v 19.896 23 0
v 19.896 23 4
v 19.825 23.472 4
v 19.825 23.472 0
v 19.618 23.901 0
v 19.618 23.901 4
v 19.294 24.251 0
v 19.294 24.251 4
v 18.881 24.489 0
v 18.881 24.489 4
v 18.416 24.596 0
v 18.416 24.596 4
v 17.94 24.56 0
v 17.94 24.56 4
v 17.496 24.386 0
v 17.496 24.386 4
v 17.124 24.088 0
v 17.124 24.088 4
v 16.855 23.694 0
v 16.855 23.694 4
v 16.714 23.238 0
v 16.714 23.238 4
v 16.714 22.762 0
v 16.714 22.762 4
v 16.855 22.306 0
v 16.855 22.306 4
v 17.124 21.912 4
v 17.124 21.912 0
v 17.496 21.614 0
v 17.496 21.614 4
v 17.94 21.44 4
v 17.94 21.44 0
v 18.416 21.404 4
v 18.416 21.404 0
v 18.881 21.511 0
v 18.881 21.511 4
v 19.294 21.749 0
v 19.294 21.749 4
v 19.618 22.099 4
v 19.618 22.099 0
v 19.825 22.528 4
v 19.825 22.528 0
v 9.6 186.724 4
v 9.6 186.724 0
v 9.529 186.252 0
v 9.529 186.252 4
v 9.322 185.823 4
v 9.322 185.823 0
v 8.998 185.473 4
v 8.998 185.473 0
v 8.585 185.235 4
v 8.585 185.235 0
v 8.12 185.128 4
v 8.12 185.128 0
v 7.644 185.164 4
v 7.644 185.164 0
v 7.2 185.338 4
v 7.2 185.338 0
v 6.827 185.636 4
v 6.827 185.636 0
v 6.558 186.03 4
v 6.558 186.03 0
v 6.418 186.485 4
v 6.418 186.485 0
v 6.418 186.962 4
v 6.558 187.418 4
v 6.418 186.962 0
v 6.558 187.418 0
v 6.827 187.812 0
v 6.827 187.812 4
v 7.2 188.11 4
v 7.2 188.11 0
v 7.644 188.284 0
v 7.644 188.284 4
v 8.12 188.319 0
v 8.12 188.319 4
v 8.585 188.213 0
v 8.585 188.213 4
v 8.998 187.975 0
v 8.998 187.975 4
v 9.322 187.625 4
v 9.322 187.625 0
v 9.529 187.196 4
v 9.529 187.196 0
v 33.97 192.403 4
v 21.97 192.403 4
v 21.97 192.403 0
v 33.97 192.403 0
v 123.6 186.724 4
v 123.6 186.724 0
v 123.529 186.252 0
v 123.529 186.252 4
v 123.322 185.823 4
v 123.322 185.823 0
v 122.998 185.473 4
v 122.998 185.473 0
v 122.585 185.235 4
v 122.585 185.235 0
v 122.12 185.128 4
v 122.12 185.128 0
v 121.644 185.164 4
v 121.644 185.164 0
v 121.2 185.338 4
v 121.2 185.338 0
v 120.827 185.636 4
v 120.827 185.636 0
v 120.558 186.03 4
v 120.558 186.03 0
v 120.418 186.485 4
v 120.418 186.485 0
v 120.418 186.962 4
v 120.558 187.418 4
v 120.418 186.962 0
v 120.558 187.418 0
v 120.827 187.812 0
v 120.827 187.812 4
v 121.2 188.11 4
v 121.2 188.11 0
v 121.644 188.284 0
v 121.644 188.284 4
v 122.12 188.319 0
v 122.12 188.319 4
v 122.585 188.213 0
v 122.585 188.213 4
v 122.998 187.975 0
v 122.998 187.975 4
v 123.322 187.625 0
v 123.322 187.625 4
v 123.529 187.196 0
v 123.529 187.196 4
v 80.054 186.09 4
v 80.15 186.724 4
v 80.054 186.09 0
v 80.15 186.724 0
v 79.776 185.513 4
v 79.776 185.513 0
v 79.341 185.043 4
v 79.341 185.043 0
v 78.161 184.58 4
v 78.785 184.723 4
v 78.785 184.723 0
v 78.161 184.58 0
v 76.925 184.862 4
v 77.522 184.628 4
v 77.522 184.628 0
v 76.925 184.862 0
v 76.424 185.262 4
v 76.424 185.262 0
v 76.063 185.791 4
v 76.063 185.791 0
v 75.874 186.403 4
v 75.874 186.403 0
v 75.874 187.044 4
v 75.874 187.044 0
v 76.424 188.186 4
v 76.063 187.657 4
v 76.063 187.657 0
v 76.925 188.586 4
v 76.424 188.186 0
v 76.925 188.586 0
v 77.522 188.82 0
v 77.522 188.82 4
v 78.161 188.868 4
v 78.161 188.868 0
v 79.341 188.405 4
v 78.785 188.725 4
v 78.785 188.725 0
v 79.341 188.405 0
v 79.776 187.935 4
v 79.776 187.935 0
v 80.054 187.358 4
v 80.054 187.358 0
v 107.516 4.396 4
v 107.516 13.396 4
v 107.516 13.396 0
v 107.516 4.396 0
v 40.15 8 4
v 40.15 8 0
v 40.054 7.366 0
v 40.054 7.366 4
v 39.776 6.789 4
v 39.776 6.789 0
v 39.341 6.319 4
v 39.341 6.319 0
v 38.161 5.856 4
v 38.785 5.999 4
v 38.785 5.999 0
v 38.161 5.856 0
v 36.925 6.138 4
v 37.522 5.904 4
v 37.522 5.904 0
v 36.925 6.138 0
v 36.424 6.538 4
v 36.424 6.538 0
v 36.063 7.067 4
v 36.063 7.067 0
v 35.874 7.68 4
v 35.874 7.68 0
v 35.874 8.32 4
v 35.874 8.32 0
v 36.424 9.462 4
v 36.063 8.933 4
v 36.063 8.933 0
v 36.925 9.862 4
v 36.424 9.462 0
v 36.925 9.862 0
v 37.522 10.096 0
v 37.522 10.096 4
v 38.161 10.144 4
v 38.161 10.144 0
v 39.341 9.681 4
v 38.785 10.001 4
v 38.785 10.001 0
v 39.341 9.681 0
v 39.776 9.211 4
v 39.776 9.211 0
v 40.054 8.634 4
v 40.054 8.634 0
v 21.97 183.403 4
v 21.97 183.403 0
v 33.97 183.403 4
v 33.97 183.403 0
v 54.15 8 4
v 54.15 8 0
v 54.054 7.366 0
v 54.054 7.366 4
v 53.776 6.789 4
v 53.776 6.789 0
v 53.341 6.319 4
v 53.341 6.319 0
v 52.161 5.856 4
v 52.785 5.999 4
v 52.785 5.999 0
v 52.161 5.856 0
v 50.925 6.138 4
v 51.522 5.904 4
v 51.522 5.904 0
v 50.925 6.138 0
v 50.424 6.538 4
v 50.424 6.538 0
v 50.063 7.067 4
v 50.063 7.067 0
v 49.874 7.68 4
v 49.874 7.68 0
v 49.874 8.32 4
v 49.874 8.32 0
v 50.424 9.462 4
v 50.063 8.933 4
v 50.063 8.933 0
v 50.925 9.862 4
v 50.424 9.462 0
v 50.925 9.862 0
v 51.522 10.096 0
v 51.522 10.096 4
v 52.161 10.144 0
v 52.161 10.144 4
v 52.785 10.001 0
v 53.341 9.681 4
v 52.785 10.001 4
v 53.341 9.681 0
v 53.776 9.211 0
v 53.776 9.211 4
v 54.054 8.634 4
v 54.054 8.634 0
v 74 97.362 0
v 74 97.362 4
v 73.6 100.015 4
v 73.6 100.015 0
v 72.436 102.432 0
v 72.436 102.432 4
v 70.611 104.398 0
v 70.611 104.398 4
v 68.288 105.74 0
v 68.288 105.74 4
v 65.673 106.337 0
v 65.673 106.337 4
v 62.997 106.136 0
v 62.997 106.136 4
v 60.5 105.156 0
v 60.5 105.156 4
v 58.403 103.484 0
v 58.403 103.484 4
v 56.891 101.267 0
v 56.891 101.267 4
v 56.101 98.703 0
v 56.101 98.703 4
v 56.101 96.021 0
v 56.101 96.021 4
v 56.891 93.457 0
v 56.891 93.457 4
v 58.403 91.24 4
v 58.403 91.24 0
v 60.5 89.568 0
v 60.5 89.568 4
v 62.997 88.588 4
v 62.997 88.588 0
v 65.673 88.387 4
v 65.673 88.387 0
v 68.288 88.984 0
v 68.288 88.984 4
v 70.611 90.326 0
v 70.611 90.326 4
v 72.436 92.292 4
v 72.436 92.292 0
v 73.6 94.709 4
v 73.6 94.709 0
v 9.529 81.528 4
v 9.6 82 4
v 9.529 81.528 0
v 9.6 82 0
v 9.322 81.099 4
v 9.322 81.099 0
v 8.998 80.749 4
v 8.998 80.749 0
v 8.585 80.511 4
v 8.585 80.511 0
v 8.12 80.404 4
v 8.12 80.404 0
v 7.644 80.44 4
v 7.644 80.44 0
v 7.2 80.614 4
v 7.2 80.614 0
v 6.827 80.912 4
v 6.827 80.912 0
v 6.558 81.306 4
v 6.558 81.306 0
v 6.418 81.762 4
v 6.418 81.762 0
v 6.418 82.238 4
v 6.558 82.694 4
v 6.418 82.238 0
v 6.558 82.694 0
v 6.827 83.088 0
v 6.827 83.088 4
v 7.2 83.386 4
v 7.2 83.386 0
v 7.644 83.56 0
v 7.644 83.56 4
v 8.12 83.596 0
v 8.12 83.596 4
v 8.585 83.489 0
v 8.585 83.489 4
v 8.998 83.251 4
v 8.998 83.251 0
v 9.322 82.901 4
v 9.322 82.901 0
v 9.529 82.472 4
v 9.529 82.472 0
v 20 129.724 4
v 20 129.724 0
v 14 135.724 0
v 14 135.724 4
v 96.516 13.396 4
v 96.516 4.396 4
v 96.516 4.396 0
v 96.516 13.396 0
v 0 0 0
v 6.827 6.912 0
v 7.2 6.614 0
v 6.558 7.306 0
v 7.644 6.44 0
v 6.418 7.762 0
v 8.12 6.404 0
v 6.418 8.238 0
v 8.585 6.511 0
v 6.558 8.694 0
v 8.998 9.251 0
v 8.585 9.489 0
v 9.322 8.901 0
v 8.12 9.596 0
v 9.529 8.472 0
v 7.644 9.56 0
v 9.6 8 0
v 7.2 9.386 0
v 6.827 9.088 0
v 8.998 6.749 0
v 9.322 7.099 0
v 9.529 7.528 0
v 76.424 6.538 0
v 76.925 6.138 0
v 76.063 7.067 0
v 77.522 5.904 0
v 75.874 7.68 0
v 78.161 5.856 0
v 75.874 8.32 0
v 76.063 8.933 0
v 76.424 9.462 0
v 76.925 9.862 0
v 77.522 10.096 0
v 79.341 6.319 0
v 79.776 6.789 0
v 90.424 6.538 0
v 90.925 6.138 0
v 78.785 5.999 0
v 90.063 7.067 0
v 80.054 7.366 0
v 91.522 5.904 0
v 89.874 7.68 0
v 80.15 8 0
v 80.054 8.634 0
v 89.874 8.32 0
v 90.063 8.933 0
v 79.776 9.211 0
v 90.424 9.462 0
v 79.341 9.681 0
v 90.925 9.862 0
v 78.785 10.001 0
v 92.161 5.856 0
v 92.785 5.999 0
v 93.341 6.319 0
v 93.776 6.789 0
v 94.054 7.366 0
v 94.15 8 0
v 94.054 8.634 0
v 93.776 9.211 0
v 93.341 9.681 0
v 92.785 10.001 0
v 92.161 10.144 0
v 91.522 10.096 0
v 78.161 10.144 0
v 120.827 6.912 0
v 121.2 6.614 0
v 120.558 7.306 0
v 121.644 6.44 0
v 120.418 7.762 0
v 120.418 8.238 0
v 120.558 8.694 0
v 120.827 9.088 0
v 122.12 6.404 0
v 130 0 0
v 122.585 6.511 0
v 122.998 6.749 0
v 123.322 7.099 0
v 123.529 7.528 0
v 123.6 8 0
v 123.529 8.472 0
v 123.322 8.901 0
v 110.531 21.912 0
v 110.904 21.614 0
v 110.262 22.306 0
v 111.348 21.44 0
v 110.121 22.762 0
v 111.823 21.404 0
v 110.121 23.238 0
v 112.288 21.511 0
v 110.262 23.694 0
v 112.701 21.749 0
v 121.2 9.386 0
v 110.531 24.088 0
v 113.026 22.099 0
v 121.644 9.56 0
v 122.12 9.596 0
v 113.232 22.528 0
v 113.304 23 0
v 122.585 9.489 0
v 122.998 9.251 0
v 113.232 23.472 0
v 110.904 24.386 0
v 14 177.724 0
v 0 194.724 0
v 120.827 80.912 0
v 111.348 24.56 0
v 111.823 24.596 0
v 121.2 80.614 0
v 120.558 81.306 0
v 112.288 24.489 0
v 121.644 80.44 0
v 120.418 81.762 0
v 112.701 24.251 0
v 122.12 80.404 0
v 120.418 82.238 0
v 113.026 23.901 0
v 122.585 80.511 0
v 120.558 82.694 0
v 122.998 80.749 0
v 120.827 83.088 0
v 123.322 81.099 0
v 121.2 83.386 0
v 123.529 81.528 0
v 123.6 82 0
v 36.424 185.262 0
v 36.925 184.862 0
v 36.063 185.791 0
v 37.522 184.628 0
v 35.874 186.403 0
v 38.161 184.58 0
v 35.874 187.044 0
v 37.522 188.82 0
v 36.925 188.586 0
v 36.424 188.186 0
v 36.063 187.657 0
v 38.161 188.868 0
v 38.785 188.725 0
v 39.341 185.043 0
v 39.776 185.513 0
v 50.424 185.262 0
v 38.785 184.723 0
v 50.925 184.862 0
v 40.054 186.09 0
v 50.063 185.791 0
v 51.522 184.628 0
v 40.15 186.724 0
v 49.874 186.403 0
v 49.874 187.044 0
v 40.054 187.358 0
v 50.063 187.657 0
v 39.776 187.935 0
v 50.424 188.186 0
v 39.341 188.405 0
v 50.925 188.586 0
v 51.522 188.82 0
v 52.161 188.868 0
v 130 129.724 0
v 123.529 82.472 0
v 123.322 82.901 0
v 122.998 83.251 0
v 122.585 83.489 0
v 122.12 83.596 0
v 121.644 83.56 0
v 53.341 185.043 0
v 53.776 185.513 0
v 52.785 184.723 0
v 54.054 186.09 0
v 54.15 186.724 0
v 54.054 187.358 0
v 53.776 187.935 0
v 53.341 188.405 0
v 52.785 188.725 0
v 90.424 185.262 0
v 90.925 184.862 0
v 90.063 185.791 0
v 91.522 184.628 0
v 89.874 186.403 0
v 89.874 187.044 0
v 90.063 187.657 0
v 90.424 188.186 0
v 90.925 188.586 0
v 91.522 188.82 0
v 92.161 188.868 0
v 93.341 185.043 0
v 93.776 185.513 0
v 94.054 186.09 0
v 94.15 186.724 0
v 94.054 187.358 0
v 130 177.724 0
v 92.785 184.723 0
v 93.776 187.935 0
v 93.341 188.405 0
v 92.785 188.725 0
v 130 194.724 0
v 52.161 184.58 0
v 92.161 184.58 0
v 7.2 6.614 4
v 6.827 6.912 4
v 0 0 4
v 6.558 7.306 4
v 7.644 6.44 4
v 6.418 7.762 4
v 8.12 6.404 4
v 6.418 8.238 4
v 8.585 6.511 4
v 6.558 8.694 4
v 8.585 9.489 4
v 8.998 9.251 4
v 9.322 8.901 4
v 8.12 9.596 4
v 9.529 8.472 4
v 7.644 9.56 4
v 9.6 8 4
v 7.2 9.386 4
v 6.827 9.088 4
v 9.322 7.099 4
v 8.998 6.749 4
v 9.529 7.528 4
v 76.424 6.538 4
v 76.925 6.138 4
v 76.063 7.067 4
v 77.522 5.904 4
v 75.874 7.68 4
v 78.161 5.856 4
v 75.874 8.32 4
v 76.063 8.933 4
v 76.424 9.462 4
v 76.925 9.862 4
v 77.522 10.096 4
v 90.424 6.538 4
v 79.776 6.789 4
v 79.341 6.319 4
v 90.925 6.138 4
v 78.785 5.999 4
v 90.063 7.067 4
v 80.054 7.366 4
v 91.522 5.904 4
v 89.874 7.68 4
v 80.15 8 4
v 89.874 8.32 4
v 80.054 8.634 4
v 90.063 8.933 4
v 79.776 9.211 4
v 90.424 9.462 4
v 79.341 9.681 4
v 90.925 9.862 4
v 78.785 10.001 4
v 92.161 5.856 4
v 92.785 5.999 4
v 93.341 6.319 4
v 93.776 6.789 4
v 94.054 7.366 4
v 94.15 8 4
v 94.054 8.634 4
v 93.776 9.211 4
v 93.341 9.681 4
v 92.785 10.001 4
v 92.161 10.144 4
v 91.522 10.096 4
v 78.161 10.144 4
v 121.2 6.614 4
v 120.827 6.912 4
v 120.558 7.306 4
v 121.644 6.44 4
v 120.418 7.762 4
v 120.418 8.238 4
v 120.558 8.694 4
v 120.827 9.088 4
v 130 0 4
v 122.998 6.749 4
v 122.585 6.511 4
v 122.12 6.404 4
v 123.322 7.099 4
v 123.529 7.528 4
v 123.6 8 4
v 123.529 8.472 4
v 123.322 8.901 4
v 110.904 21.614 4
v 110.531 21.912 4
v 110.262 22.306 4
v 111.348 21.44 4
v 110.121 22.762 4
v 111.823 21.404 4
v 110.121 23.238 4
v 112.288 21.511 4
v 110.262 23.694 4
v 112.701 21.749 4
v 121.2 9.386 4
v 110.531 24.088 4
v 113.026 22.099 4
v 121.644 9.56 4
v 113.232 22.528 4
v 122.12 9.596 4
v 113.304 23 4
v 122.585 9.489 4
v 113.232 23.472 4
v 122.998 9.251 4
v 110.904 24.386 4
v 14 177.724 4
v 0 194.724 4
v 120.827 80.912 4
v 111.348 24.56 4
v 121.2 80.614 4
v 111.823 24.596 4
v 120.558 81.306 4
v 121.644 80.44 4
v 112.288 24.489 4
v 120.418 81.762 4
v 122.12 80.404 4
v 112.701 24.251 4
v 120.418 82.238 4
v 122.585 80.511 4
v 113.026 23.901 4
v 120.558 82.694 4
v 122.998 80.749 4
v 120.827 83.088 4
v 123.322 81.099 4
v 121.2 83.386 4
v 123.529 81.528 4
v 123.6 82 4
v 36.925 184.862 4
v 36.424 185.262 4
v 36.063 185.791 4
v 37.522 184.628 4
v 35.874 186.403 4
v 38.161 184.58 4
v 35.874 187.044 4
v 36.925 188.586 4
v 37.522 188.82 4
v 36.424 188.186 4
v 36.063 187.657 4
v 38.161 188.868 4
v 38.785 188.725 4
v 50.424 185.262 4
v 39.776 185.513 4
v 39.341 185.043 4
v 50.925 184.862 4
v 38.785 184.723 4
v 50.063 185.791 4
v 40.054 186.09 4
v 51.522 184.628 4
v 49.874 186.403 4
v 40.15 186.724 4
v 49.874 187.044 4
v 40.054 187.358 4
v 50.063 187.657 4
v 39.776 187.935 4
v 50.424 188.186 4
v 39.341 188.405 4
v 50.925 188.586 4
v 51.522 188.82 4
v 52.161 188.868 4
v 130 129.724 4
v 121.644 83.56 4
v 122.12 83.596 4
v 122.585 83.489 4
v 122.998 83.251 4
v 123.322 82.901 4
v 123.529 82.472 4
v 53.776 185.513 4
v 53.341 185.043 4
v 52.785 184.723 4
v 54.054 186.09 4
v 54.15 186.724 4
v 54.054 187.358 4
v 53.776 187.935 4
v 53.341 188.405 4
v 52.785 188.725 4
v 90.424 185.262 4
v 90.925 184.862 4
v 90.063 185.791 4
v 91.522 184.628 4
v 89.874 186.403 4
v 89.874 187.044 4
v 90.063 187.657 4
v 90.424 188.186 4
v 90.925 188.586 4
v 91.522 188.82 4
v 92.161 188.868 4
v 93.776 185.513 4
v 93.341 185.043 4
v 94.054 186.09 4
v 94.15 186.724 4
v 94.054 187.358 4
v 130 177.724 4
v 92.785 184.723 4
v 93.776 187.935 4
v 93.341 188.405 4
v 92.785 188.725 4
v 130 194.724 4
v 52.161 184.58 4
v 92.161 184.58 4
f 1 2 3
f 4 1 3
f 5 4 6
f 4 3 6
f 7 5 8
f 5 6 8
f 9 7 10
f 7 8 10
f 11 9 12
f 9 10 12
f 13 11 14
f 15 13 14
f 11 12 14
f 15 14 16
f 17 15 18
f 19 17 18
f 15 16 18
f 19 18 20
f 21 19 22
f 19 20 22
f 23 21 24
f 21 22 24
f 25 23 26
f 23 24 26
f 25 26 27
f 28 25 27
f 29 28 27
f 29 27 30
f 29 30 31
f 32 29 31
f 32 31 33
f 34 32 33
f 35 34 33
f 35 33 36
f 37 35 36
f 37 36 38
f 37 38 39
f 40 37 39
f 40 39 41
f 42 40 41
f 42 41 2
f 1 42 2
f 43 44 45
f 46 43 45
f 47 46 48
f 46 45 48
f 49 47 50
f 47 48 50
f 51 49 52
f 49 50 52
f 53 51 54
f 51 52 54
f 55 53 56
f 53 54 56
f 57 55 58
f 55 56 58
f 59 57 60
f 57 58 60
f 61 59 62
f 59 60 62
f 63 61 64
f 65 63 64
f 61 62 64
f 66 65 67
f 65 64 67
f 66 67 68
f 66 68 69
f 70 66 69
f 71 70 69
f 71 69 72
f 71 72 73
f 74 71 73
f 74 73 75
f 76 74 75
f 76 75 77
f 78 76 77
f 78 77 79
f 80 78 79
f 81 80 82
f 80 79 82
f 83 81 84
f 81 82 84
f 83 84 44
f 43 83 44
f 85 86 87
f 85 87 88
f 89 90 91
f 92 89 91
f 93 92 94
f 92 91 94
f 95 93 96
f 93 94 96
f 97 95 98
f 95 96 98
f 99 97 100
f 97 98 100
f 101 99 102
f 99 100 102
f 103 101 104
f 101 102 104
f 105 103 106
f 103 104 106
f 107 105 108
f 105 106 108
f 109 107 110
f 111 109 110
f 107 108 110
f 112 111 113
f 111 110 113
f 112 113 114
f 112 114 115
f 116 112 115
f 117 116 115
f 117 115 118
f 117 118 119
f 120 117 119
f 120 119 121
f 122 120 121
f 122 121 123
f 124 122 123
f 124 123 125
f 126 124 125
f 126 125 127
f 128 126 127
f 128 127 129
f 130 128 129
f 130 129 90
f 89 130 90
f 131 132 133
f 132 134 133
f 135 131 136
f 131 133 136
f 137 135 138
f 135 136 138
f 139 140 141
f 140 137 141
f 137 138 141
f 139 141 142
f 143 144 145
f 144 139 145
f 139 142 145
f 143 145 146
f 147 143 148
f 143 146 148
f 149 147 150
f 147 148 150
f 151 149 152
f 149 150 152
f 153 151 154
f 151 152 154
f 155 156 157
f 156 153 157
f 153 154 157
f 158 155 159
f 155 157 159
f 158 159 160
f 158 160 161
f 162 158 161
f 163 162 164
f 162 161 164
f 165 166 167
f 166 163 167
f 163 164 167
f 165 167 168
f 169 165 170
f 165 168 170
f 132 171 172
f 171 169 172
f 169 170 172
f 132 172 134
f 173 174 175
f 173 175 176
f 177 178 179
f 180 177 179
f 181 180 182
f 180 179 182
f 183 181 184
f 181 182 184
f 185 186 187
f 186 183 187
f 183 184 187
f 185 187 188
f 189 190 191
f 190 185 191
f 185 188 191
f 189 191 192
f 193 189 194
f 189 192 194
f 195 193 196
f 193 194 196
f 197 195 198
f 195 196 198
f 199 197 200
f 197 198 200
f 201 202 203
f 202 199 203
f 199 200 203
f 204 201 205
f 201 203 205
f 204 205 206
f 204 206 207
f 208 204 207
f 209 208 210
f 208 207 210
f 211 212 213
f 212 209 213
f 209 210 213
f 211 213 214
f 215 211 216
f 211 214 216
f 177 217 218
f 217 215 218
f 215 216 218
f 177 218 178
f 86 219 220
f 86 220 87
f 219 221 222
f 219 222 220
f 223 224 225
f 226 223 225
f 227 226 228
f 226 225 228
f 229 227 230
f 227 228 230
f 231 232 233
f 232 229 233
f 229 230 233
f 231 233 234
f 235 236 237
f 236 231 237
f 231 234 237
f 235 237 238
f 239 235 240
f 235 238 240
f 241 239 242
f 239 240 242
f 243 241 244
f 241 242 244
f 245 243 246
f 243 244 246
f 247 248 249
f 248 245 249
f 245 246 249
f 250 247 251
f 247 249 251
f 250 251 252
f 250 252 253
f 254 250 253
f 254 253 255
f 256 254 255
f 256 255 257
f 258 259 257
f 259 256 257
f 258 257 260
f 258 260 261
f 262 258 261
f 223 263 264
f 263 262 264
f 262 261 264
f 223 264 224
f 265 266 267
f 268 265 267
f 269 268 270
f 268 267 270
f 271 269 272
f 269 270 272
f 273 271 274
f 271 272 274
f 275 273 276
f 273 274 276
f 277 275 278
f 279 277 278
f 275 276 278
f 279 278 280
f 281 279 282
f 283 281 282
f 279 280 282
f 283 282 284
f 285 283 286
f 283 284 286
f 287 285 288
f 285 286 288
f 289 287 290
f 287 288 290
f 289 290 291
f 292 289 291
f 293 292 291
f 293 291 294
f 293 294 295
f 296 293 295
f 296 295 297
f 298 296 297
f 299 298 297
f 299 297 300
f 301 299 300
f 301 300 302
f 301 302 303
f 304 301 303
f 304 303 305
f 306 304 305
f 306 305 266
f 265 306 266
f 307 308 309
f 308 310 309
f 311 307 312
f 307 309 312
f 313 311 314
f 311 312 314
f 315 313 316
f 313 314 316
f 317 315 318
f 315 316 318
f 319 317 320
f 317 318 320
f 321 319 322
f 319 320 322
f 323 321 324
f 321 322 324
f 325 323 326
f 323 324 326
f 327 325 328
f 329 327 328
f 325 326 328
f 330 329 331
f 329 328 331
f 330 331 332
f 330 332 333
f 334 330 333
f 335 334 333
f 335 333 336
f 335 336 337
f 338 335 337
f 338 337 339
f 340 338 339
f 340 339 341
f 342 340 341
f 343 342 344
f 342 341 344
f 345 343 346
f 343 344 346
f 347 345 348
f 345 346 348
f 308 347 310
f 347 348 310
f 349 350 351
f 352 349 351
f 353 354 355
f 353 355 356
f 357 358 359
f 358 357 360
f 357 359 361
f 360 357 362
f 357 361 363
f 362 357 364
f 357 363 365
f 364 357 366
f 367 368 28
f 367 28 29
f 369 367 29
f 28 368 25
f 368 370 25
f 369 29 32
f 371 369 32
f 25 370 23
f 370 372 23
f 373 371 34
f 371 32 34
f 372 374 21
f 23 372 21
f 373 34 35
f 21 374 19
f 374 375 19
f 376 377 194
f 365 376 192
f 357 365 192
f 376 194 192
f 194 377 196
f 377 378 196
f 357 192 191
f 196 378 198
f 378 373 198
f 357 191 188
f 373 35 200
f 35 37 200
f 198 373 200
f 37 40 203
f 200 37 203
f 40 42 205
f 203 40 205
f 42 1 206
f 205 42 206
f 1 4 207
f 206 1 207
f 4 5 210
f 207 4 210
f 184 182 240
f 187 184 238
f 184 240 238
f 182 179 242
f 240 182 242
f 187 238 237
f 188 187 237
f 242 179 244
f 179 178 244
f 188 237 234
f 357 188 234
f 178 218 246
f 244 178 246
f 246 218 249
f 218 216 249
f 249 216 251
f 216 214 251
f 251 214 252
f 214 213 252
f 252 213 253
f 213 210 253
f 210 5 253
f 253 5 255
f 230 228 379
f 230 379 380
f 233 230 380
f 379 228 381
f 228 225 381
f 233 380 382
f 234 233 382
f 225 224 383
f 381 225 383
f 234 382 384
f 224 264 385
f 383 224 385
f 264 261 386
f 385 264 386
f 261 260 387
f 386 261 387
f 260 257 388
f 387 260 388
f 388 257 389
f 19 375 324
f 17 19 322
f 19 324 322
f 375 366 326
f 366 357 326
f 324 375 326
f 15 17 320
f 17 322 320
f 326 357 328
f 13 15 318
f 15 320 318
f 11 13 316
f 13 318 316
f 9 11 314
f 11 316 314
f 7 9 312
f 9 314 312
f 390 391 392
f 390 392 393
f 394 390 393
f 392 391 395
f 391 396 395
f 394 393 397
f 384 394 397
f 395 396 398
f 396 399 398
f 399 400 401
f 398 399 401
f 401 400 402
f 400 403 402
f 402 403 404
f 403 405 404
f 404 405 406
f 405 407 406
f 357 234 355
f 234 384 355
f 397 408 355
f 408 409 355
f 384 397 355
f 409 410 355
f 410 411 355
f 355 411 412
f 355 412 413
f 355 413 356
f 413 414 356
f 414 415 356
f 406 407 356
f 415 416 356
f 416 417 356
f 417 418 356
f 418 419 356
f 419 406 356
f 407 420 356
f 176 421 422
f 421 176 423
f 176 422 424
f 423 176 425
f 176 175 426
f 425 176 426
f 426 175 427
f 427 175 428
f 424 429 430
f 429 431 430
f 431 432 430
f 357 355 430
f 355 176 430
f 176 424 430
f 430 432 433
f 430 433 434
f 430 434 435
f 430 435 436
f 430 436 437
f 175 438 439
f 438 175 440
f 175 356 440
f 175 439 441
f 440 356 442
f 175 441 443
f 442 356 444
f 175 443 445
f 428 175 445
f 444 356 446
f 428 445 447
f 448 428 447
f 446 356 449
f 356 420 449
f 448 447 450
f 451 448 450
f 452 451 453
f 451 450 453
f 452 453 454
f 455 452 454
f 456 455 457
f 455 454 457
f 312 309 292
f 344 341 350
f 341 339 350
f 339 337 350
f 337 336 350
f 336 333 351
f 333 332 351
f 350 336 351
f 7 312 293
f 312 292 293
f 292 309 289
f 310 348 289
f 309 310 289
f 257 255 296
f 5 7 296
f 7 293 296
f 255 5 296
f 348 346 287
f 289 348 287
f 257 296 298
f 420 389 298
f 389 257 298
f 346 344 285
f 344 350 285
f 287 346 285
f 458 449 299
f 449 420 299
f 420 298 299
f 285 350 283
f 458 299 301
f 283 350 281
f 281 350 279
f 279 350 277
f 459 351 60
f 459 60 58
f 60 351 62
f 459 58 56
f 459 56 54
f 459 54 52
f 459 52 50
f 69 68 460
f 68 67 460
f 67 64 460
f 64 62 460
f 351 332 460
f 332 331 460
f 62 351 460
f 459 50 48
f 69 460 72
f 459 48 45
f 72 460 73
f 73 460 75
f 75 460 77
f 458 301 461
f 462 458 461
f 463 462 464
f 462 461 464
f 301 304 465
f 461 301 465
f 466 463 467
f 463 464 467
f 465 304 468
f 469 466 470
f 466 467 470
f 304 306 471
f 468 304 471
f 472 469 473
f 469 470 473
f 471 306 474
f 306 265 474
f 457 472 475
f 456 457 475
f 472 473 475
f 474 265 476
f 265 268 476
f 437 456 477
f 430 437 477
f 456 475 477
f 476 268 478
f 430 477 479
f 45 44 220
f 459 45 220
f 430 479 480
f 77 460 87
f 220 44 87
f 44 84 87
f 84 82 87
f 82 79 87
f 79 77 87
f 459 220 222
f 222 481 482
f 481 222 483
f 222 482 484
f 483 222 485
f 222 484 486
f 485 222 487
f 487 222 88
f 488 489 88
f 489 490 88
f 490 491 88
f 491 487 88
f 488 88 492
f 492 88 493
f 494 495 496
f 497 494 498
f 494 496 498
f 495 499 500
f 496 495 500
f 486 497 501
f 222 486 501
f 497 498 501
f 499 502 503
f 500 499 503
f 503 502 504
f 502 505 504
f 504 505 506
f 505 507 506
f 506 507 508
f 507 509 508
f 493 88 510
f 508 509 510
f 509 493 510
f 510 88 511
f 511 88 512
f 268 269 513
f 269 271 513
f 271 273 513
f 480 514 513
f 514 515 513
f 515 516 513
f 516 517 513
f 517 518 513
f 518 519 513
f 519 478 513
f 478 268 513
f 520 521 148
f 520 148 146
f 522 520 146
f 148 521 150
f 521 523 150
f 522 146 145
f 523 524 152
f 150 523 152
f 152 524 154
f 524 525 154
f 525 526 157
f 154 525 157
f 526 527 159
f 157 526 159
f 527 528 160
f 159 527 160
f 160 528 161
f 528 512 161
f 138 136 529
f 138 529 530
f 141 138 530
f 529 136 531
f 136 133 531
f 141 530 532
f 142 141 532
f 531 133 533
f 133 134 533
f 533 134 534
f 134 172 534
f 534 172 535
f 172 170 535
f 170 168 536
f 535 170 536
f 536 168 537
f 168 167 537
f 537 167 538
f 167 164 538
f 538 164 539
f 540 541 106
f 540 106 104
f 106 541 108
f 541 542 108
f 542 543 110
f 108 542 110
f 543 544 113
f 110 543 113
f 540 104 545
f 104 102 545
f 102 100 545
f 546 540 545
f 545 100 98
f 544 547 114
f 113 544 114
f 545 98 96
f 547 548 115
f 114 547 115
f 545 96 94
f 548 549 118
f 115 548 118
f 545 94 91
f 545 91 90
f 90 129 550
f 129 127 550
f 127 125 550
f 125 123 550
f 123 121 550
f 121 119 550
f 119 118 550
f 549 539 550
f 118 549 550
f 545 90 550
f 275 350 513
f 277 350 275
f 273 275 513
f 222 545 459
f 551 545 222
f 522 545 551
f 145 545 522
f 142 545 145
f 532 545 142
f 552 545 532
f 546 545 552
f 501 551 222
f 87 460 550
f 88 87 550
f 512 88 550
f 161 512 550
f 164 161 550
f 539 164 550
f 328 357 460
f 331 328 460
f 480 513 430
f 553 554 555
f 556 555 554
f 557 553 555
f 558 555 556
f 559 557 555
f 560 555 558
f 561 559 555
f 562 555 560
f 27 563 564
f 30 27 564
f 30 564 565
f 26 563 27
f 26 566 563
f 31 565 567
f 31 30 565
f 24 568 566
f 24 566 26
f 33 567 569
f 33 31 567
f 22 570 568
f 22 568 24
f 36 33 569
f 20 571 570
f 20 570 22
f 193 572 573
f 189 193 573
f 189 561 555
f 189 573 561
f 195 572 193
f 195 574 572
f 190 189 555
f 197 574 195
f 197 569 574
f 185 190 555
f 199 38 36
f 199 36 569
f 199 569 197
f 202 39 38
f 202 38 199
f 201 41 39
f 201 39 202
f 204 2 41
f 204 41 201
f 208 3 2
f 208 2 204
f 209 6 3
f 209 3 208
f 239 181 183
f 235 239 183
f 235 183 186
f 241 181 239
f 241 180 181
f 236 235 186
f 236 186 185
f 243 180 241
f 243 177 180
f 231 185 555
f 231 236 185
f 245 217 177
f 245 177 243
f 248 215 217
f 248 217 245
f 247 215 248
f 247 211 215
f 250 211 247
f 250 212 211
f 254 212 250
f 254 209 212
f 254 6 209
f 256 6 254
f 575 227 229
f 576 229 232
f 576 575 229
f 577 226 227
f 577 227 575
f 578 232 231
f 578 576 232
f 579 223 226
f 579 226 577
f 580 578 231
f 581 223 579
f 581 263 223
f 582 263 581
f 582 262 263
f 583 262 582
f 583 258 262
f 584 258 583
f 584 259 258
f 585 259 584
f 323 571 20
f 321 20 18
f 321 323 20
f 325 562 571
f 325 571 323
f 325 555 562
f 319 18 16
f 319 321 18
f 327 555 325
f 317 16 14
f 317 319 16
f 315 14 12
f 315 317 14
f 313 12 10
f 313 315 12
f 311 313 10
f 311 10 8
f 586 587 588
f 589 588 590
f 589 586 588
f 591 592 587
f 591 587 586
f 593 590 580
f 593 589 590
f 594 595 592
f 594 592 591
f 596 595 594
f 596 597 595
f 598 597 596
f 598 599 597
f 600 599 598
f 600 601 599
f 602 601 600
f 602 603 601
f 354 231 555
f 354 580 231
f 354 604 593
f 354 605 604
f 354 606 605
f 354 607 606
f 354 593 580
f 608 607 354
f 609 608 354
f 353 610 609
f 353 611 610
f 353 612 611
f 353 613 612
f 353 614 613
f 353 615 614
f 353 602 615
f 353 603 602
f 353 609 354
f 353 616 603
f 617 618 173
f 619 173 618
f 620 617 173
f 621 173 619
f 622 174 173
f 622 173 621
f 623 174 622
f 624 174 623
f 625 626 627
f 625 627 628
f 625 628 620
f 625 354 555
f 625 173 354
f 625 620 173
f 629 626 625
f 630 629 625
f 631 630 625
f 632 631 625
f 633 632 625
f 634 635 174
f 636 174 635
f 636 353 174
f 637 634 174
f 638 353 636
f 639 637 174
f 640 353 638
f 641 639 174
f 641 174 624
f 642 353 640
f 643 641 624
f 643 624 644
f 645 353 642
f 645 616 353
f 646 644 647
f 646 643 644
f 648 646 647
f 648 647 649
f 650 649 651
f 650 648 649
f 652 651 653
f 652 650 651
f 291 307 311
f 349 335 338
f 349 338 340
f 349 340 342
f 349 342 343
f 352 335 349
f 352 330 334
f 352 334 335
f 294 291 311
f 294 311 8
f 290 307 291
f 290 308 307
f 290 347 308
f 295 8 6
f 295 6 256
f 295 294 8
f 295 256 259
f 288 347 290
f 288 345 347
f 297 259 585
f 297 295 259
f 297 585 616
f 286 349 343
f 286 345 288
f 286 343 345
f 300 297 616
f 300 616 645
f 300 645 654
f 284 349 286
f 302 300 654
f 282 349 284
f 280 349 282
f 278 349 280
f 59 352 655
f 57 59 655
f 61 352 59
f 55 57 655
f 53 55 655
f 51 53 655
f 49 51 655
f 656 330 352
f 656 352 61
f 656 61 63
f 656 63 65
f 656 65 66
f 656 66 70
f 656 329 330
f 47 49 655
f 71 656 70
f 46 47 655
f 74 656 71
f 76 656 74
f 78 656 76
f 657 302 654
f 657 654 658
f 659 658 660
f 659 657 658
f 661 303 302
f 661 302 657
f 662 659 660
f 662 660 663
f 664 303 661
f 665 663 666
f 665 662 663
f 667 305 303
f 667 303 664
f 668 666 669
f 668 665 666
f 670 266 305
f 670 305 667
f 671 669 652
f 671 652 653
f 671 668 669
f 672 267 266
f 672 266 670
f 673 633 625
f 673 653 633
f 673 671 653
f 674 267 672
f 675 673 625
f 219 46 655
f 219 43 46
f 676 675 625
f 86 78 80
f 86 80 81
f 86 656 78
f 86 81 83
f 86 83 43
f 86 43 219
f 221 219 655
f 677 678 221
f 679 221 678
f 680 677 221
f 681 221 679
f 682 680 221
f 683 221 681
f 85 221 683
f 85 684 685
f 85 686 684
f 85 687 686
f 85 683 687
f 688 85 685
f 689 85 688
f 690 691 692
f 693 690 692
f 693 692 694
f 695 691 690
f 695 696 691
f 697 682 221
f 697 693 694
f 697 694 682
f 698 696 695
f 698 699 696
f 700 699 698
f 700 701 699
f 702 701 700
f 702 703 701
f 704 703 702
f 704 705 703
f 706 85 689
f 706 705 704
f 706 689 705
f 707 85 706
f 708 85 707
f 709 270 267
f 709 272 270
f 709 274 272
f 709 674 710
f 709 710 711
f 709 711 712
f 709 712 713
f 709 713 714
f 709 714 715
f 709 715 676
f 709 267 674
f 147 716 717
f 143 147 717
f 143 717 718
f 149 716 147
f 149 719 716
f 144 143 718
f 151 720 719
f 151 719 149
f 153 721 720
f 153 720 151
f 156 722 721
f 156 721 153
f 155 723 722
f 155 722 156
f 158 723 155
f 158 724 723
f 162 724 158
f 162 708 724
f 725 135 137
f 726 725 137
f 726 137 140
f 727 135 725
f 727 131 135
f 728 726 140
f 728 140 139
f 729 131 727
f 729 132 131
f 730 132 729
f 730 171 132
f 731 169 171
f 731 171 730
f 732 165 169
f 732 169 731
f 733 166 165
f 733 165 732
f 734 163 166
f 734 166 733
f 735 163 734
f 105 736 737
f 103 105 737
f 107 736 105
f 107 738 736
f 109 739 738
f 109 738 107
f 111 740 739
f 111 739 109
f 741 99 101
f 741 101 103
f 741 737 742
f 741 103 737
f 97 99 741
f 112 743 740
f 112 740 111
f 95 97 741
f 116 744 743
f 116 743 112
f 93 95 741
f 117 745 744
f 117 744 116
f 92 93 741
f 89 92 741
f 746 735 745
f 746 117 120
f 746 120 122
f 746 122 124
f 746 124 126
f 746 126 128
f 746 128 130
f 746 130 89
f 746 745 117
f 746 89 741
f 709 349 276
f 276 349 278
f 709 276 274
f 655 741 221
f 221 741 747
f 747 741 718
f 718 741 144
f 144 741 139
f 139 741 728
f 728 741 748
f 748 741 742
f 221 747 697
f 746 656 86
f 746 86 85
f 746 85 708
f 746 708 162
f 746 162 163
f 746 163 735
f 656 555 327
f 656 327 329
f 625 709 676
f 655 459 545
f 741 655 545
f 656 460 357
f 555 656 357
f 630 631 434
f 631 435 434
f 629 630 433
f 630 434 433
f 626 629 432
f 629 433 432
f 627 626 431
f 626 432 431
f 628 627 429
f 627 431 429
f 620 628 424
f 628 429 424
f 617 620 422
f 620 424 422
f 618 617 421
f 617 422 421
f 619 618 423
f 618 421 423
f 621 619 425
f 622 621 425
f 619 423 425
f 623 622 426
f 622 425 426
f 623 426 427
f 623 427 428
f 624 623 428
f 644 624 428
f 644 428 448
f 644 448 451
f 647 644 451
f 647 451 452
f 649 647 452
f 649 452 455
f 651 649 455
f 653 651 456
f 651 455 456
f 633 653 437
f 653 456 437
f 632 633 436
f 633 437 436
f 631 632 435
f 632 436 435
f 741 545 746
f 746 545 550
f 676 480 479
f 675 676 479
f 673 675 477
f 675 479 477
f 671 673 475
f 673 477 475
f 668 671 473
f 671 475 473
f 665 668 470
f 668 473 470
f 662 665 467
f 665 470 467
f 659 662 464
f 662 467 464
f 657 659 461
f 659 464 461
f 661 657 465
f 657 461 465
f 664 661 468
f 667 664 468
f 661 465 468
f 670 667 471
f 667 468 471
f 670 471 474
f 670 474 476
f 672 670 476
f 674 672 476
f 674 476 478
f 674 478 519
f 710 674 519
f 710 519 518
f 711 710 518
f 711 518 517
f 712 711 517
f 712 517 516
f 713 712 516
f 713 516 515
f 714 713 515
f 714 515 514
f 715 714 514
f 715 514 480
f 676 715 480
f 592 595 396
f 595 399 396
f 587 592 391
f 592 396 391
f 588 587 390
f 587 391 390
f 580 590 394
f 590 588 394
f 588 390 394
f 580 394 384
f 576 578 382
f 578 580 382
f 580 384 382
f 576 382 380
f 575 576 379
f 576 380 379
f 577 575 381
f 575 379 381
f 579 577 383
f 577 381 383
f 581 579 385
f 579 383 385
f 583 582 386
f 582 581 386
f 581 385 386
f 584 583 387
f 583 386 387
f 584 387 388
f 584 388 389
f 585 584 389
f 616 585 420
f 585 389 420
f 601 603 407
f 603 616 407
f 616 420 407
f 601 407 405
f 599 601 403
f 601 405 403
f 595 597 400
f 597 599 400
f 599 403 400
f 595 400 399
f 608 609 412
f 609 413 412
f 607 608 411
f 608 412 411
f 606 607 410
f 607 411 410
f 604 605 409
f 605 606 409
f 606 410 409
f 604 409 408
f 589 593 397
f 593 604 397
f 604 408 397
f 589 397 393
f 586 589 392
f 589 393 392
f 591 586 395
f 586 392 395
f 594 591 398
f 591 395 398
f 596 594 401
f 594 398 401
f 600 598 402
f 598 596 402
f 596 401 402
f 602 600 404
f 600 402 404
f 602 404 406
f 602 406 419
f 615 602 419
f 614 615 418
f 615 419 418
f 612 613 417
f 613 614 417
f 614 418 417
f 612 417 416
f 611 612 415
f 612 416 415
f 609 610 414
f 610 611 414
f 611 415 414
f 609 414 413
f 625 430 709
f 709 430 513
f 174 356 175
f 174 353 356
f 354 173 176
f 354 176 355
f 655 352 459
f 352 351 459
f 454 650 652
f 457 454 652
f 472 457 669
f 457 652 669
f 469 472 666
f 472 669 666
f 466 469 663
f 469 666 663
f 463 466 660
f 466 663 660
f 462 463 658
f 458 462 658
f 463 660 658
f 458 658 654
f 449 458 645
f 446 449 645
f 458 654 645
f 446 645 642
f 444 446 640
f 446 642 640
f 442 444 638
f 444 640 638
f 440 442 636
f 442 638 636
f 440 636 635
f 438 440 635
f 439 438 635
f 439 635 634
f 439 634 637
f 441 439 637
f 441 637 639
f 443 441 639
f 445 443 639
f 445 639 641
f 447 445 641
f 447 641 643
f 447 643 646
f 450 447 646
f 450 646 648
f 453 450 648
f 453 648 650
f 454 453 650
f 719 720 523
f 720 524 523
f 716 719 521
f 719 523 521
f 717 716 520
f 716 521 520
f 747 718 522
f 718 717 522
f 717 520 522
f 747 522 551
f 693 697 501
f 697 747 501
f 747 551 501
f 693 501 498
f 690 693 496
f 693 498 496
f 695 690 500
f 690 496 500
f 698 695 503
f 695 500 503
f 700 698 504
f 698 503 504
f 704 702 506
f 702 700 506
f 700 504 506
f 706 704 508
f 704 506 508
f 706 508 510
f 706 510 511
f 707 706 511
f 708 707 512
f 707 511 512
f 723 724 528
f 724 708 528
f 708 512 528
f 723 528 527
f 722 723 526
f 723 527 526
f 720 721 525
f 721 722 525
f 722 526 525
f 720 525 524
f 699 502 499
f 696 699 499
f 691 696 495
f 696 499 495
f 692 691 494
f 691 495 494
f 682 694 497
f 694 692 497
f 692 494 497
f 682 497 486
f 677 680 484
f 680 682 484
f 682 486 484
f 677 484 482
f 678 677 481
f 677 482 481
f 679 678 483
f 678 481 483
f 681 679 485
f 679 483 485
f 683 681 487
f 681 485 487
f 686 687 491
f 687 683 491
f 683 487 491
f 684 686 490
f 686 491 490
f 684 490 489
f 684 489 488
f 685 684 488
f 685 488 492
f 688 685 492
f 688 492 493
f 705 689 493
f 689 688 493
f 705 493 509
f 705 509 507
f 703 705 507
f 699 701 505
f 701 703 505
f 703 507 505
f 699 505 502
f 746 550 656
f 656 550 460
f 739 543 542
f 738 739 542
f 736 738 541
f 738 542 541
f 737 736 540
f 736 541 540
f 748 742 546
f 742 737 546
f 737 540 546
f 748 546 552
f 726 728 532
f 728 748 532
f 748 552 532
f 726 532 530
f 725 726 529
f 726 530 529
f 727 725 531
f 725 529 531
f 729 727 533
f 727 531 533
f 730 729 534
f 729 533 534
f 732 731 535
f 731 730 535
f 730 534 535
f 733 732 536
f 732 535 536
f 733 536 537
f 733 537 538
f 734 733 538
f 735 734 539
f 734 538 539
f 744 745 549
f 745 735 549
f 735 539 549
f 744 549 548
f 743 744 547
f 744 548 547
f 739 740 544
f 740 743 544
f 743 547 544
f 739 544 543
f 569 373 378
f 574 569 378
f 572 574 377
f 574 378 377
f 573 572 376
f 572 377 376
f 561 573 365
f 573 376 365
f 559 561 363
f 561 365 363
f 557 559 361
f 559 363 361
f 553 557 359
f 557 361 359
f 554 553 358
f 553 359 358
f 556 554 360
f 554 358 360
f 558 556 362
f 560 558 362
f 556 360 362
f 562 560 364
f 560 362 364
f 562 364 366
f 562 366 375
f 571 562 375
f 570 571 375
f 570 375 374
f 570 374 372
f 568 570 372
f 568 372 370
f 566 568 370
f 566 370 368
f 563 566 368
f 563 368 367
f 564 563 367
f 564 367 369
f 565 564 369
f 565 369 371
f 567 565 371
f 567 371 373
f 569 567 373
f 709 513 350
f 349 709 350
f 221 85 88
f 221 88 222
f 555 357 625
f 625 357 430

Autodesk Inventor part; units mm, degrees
ref_plane "YZ Plane" through (0, 0, 0) normal (1, 0, 0) x (0, 1, 0)
ref_plane "XZ Plane" through (0, 0, 0) normal (0, 1, 0) x (-1, 0, 0)
ref_plane "XY Plane" through (0, 0, 0) normal (0, 0, 1) x (1, 0, 0)
sketch "スケッチ3" plane through (0, 0, 0) normal (0, 0, 1) x (1, 0, 0)
  line L0 (129.999999, 177.723921) -> (129.999999, 194.723921)
  line L1 (129.999999, 194.723921) -> (-0.000001, 194.723921)
  line L2 (-0.000001, 0) -> (129.999999, 0)
  circle A0 centre (77.999999, 186.723921) radius 2.15
  circle A1 centre (91.999999, 186.723921) radius 2.15
  circle A2 centre (51.999999, 186.723921) radius 2.15
  circle A3 centre (37.999999, 186.723921) radius 2.15
  circle A4 centre (77.999999, 8) radius 2.15
  circle A5 centre (91.999999, 8) radius 2.15
  circle A6 centre (51.999999, 8) radius 2.15
  circle A7 centre (37.999999, 8) radius 2.15
  line L3 (129.999999, 129.723921) -> (19.999999, 129.723921)
  line L4 (13.999999, 135.723921) -> (13.999999, 177.723921)
  line L5 (13.999999, 177.723921) -> (129.999999, 177.723921)
  line L6 (19.999999, 129.723921) -> (13.999999, 135.723921)
  circle A8 centre (64.999999, 97.36196) radius 8
  circle A9 centre (7.999999, 186.723921) radius 1.6
  circle A10 centre (121.999999, 186.723921) radius 1.6
  circle A11 centre (121.999999, 8) radius 1.6
  circle A12 centre (7.999999, 8) radius 1.6
  circle A13 centre (7.999999, 82) radius 1.6
  circle A14 centre (121.999999, 82) radius 1.6
  line L7 (64.999999, 88.36196) -> (64.999999, 42.36196)
  line L8 (3.399999, 186.723921) -> (12.599999, 186.723921)
  line L9 (7.999999, 182.123921) -> (7.999999, 191.323921)
  line L10 (117.399999, 186.723921) -> (126.599999, 186.723921)
  line L11 (121.999999, 182.123921) -> (121.999999, 191.323921)
  line L12 (117.399999, 8) -> (126.599999, 8)
  line L13 (121.999999, 3.4) -> (121.999999, 12.6)
  line L14 (3.399999, 8) -> (12.599999, 8)
  line L15 (7.999999, 3.4) -> (7.999999, 12.6)
  line L16 (3.399999, 82) -> (12.599999, 82)
  line L17 (7.999999, 77.4) -> (7.999999, 86.6)
  line L18 (126.599999, 82) -> (117.399999, 82)
  line L19 (121.999999, 77.4) -> (121.999999, 86.6)
  circle A15 centre (91.999999, 186.723921) radius 2.15
  circle A16 centre (77.999999, 186.723921) radius 2.15
  circle A17 centre (51.999999, 186.723921) radius 2.15
  circle A18 centre (37.999999, 186.723921) radius 2.15
  circle A19 centre (64.999999, 97.36196) radius 8
  circle A20 centre (91.999999, 8) radius 2.15
  circle A21 centre (77.999999, 8) radius 2.15
  circle A22 centre (51.999999, 8) radius 2.15
  circle A23 centre (37.999999, 8) radius 2.15
  circle A24 centre (7.999999, 8) radius 1.6
  circle A25 centre (121.999999, 8) radius 1.6
  circle A26 centre (121.999999, 82) radius 1.6
  circle A27 centre (121.999999, 186.723921) radius 1.6
  circle A28 centre (7.999999, 186.723921) radius 1.6
  circle A29 centre (7.999999, 82) radius 1.6
  line L20 (-0.000001, 0) -> (129.999999, 0)
  line L21 (129.999999, 177.723921) -> (129.999999, 194.723921)
  line L22 (129.999999, 194.723921) -> (-0.000001, 194.723921)
  line L23 (129.999999, 177.723921) -> (13.999999, 177.723921)
  line L24 (13.999999, 177.723921) -> (13.999999, 135.723921)
  line L25 (13.999999, 135.723921) -> (19.999999, 129.723921)
  line L26 (-0.000001, 194.723921) -> (-0.000001, 119.36196)
  line L27 (-0.000001, 86.6) -> (-0.000001, 0)
  line L28 (-0.000001, 194.723921) -> (-0.000001, 119.36196)
  line L29 (-0.000001, 86.6) -> (-0.000001, 0)
  line L30 (129.999999, 0) -> (129.999999, 86.6)
  line L31 (129.999999, 125.36196) -> (129.999999, 129.723921)
  line L32 (129.999999, 0) -> (129.999999, 86.6)
  line L33 (129.999999, 125.36196) -> (129.999999, 129.723921)
  circle A30 centre (18.296419, 23) radius 1.6
  circle A31 centre (111.703579, 23) radius 1.6
  line L34 (-0.000001, 119.36196) -> (-0.000001, 86.6)
  line L35 (129.999999, 86.6) -> (129.999999, 125.36196)
  point P0 (0, 0)
  point P1 (0, 0)
sketch "スケッチ4" plane through (0, 0, 0) normal (0, 0, 1) x (1, 0, 0)
  point P0 (0, 0)
extrude "押し出し1" add sketch "スケッチ3" along normal blind 4 contours L5 L4 L6 L3 L31 L35 L30 L2 L27 L34 L26 L1 L0 | A30 | A31
sketch "スケッチ5" plane through (0, 0, 4) normal (0, 0, 1) x (1, 0, 0)
  line L0 (-10, 0) -> (140, 0)
  arc A0 (140, -0.0003) -> (140, 0.0003) centre (140, 0) ccw
  arc A1 (-10, 0.0003) -> (-10, -0.0003) centre (-10, 0) ccw
  line L1 (140, 0) -> (140, 194.7239)
  arc A2 (140.0002, 194.7239) -> (139.9998, 194.7239) centre (140, 194.7239) ccw
  arc A3 (139.9998, 0) -> (140.0002, 0) centre (140, 0) ccw
  line L2 (140, 194.7239) -> (-10, 194.7239)
  arc A4 (-10, 194.7242) -> (-10, 194.7237) centre (-10, 194.72395) ccw
  arc A5 (140, 194.7237) -> (140, 194.7242) centre (140, 194.72395) ccw
  arc A6 (-10.0004, 0) -> (-10, 0) centre (-10.0002, 0) ccw
  arc A7 (-9.9996, 194.7239) -> (-10, 194.7239) centre (-9.9998, 194.7239) ccw
  arc A8 (65, 88.362) -> (65, 106.362) centre (65, 97.362) ccw
  arc A9 (65, 106.362) -> (65, 88.362) centre (65, 97.362) ccw
  arc A10 (65, 158.7239) -> (65, 176.7239) centre (65, 167.7239) ccw
  arc A11 (65, 176.7239) -> (65, 158.7239) centre (65, 167.7239) ccw
  line L3 (125.6971, 165.1236) -> (118.0771, 165.1236)
  line L4 (115.5371, 165.1236) -> (115.5371, 160.0436)
  line L5 (121.66, 165.205) -> (120.39, 165.205)
  arc A12 (121.66, 165.1669) -> (121.66, 165.2431) centre (121.66, 165.205) ccw
  line L6 (81.02, 174.095) -> (85.719, 174.095)
  arc A13 (81.02, 174.1331) -> (81.02, 174.0569) centre (81.02, 174.095) ccw
  line L7 (81.02, 174.095) -> (81.02, 165.205)
  arc A14 (80.9819, 165.205) -> (81.0581, 165.205) centre (81.02, 165.205) ccw
  arc A15 (81.0581, 174.095) -> (80.9819, 174.095) centre (81.02, 174.095) ccw
  line L8 (121.66, 165.205) -> (121.66, 174.095)
  arc A16 (121.6981, 174.095) -> (121.6219, 174.095) centre (121.66, 174.095) ccw
  arc A17 (121.6219, 165.205) -> (121.6981, 165.205) centre (121.66, 165.205) ccw
  line L9 (82.29, 165.205) -> (81.02, 165.205)
  arc A18 (81.02, 165.2431) -> (81.02, 165.1669) centre (81.02, 165.205) ccw
  line L10 (121.66, 174.095) -> (117.342, 174.095)
  arc A19 (121.66, 174.0569) -> (121.66, 174.1331) centre (121.66, 174.095) ccw
  line L11 (52.85, 166.325) -> (48.151, 166.325)
  arc A20 (52.85, 166.2869) -> (52.85, 166.3631) centre (52.85, 166.325) ccw
  line L12 (52.85, 166.325) -> (52.85, 175.215)
  arc A21 (52.8881, 175.215) -> (52.8119, 175.215) centre (52.85, 175.215) ccw
  arc A22 (52.8119, 166.325) -> (52.8881, 166.325) centre (52.85, 166.325) ccw
  line L13 (51.58, 175.215) -> (52.85, 175.215)
  arc A23 (52.85, 175.1769) -> (52.85, 175.2531) centre (52.85, 175.215) ccw
  arc A24 (72.9742, 175.4632) -> (72.9742, 175.768) centre (72.9742, 175.6156) ccw
  arc A25 (72.9742, 175.768) -> (72.9742, 175.4632) centre (72.9742, 175.6156) ccw
  arc A26 (72.9742, 175.4632) -> (72.9742, 175.768) centre (72.9742, 175.6156) ccw
  arc A27 (72.9742, 175.768) -> (72.9742, 175.4632) centre (72.9742, 175.6156) ccw
  arc A28 (86.106, 110.5662) -> (86.106, 110.871) centre (86.106, 110.7186) ccw
  arc A29 (86.106, 110.871) -> (86.106, 110.5662) centre (86.106, 110.7186) ccw
  arc A30 (86.106, 110.5662) -> (86.106, 110.871) centre (86.106, 110.7186) ccw
  arc A31 (86.106, 110.871) -> (86.106, 110.5662) centre (86.106, 110.7186) ccw
  line L14 (80.9819, 174.095) -> (121.6981, 174.095)
  line L15 (121.6981, 174.095) -> (121.6981, 165.205)
  line L16 (121.6981, 165.205) -> (80.9819, 165.205)
  line L17 (80.9819, 165.205) -> (80.9819, 174.095)
  line L18 (52.8, 176.585002) -> (11.364013, 176.585002)
  line L19 (11.364013, 176.585002) -> (11.364013, 165.1236)
  line L20 (11.364013, 165.1236) -> (52.8, 165.1236)
  line L21 (52.8, 165.1236) -> (52.8, 176.585002)
  line L22 (-10, 194.7239) -> (-10, 0)
  line L23 (21.97, 192.403451) -> (33.97, 192.403451)
  line L24 (33.97, 192.403451) -> (33.97, 183.403451)
  line L25 (33.97, 183.403451) -> (21.97, 183.403451)
  line L26 (21.97, 183.403451) -> (21.97, 192.403451)
  line L27 (0, 0) -> (129.999999, 0)
  line L28 (96.51585, 13.395653) -> (107.51585, 13.395653)
  line L29 (107.51585, 13.395653) -> (107.51585, 4.395653)
  line L30 (107.51585, 4.395653) -> (96.51585, 4.395653)
  line L31 (96.51585, 4.395653) -> (96.51585, 13.395653)
  circle A32 centre (65, 97.362) radius 9
  point P0 (71.80055, 0)
sketch "スケッチ5 outline for 押し出し2" plane through (0, 0, 4) normal (0, 0, 1) x (1, 0, 0)
  line L0 (96.51585, 13.395653) -> (107.51585, 13.395653)
  line L1 (107.51585, 13.395653) -> (107.51585, 4.395653)
  line L2 (107.51585, 4.395653) -> (96.51585, 4.395653)
  line L3 (96.51585, 4.395653) -> (96.51585, 13.395653)
  line L4 (21.97, 192.403451) -> (33.97, 192.403451)
  line L5 (33.97, 192.403451) -> (33.97, 183.403451)
  line L6 (33.97, 183.403451) -> (21.97, 183.403451)
  line L7 (21.97, 183.403451) -> (21.97, 192.403451)
  circle A0 centre (65, 97.362) radius 9
  line L8 (121.6981, 165.205) -> (121.6981, 174.095)
  line L9 (80.9819, 165.205) -> (121.6981, 165.205)
  line L10 (80.9819, 174.095) -> (80.9819, 165.205)
  line L11 (121.6981, 174.095) -> (80.9819, 174.095)
extrude "押し出し2" cut sketch "スケッチ5 outline for 押し出し2" against normal blind 10
sketch "スケッチ7" plane through (0, 0, 4) normal (0, 0, 1) x (1, 0, 0)
  point P0 (0, 0)
sketch "スケッチ8" plane through (0, 0, 4) normal (0, 0, 1) x (1, 0, 0)
  circle A0 centre (18.296419, 23) radius 1.6
  circle A1 centre (111.703579, 23) radius 1.6
  point P0 (0, 0)
extrude "押し出し5" cut sketch "スケッチ8" against normal blind 4
properties part number "2枚目kai" material "MDF 中密度繊維ボード"
